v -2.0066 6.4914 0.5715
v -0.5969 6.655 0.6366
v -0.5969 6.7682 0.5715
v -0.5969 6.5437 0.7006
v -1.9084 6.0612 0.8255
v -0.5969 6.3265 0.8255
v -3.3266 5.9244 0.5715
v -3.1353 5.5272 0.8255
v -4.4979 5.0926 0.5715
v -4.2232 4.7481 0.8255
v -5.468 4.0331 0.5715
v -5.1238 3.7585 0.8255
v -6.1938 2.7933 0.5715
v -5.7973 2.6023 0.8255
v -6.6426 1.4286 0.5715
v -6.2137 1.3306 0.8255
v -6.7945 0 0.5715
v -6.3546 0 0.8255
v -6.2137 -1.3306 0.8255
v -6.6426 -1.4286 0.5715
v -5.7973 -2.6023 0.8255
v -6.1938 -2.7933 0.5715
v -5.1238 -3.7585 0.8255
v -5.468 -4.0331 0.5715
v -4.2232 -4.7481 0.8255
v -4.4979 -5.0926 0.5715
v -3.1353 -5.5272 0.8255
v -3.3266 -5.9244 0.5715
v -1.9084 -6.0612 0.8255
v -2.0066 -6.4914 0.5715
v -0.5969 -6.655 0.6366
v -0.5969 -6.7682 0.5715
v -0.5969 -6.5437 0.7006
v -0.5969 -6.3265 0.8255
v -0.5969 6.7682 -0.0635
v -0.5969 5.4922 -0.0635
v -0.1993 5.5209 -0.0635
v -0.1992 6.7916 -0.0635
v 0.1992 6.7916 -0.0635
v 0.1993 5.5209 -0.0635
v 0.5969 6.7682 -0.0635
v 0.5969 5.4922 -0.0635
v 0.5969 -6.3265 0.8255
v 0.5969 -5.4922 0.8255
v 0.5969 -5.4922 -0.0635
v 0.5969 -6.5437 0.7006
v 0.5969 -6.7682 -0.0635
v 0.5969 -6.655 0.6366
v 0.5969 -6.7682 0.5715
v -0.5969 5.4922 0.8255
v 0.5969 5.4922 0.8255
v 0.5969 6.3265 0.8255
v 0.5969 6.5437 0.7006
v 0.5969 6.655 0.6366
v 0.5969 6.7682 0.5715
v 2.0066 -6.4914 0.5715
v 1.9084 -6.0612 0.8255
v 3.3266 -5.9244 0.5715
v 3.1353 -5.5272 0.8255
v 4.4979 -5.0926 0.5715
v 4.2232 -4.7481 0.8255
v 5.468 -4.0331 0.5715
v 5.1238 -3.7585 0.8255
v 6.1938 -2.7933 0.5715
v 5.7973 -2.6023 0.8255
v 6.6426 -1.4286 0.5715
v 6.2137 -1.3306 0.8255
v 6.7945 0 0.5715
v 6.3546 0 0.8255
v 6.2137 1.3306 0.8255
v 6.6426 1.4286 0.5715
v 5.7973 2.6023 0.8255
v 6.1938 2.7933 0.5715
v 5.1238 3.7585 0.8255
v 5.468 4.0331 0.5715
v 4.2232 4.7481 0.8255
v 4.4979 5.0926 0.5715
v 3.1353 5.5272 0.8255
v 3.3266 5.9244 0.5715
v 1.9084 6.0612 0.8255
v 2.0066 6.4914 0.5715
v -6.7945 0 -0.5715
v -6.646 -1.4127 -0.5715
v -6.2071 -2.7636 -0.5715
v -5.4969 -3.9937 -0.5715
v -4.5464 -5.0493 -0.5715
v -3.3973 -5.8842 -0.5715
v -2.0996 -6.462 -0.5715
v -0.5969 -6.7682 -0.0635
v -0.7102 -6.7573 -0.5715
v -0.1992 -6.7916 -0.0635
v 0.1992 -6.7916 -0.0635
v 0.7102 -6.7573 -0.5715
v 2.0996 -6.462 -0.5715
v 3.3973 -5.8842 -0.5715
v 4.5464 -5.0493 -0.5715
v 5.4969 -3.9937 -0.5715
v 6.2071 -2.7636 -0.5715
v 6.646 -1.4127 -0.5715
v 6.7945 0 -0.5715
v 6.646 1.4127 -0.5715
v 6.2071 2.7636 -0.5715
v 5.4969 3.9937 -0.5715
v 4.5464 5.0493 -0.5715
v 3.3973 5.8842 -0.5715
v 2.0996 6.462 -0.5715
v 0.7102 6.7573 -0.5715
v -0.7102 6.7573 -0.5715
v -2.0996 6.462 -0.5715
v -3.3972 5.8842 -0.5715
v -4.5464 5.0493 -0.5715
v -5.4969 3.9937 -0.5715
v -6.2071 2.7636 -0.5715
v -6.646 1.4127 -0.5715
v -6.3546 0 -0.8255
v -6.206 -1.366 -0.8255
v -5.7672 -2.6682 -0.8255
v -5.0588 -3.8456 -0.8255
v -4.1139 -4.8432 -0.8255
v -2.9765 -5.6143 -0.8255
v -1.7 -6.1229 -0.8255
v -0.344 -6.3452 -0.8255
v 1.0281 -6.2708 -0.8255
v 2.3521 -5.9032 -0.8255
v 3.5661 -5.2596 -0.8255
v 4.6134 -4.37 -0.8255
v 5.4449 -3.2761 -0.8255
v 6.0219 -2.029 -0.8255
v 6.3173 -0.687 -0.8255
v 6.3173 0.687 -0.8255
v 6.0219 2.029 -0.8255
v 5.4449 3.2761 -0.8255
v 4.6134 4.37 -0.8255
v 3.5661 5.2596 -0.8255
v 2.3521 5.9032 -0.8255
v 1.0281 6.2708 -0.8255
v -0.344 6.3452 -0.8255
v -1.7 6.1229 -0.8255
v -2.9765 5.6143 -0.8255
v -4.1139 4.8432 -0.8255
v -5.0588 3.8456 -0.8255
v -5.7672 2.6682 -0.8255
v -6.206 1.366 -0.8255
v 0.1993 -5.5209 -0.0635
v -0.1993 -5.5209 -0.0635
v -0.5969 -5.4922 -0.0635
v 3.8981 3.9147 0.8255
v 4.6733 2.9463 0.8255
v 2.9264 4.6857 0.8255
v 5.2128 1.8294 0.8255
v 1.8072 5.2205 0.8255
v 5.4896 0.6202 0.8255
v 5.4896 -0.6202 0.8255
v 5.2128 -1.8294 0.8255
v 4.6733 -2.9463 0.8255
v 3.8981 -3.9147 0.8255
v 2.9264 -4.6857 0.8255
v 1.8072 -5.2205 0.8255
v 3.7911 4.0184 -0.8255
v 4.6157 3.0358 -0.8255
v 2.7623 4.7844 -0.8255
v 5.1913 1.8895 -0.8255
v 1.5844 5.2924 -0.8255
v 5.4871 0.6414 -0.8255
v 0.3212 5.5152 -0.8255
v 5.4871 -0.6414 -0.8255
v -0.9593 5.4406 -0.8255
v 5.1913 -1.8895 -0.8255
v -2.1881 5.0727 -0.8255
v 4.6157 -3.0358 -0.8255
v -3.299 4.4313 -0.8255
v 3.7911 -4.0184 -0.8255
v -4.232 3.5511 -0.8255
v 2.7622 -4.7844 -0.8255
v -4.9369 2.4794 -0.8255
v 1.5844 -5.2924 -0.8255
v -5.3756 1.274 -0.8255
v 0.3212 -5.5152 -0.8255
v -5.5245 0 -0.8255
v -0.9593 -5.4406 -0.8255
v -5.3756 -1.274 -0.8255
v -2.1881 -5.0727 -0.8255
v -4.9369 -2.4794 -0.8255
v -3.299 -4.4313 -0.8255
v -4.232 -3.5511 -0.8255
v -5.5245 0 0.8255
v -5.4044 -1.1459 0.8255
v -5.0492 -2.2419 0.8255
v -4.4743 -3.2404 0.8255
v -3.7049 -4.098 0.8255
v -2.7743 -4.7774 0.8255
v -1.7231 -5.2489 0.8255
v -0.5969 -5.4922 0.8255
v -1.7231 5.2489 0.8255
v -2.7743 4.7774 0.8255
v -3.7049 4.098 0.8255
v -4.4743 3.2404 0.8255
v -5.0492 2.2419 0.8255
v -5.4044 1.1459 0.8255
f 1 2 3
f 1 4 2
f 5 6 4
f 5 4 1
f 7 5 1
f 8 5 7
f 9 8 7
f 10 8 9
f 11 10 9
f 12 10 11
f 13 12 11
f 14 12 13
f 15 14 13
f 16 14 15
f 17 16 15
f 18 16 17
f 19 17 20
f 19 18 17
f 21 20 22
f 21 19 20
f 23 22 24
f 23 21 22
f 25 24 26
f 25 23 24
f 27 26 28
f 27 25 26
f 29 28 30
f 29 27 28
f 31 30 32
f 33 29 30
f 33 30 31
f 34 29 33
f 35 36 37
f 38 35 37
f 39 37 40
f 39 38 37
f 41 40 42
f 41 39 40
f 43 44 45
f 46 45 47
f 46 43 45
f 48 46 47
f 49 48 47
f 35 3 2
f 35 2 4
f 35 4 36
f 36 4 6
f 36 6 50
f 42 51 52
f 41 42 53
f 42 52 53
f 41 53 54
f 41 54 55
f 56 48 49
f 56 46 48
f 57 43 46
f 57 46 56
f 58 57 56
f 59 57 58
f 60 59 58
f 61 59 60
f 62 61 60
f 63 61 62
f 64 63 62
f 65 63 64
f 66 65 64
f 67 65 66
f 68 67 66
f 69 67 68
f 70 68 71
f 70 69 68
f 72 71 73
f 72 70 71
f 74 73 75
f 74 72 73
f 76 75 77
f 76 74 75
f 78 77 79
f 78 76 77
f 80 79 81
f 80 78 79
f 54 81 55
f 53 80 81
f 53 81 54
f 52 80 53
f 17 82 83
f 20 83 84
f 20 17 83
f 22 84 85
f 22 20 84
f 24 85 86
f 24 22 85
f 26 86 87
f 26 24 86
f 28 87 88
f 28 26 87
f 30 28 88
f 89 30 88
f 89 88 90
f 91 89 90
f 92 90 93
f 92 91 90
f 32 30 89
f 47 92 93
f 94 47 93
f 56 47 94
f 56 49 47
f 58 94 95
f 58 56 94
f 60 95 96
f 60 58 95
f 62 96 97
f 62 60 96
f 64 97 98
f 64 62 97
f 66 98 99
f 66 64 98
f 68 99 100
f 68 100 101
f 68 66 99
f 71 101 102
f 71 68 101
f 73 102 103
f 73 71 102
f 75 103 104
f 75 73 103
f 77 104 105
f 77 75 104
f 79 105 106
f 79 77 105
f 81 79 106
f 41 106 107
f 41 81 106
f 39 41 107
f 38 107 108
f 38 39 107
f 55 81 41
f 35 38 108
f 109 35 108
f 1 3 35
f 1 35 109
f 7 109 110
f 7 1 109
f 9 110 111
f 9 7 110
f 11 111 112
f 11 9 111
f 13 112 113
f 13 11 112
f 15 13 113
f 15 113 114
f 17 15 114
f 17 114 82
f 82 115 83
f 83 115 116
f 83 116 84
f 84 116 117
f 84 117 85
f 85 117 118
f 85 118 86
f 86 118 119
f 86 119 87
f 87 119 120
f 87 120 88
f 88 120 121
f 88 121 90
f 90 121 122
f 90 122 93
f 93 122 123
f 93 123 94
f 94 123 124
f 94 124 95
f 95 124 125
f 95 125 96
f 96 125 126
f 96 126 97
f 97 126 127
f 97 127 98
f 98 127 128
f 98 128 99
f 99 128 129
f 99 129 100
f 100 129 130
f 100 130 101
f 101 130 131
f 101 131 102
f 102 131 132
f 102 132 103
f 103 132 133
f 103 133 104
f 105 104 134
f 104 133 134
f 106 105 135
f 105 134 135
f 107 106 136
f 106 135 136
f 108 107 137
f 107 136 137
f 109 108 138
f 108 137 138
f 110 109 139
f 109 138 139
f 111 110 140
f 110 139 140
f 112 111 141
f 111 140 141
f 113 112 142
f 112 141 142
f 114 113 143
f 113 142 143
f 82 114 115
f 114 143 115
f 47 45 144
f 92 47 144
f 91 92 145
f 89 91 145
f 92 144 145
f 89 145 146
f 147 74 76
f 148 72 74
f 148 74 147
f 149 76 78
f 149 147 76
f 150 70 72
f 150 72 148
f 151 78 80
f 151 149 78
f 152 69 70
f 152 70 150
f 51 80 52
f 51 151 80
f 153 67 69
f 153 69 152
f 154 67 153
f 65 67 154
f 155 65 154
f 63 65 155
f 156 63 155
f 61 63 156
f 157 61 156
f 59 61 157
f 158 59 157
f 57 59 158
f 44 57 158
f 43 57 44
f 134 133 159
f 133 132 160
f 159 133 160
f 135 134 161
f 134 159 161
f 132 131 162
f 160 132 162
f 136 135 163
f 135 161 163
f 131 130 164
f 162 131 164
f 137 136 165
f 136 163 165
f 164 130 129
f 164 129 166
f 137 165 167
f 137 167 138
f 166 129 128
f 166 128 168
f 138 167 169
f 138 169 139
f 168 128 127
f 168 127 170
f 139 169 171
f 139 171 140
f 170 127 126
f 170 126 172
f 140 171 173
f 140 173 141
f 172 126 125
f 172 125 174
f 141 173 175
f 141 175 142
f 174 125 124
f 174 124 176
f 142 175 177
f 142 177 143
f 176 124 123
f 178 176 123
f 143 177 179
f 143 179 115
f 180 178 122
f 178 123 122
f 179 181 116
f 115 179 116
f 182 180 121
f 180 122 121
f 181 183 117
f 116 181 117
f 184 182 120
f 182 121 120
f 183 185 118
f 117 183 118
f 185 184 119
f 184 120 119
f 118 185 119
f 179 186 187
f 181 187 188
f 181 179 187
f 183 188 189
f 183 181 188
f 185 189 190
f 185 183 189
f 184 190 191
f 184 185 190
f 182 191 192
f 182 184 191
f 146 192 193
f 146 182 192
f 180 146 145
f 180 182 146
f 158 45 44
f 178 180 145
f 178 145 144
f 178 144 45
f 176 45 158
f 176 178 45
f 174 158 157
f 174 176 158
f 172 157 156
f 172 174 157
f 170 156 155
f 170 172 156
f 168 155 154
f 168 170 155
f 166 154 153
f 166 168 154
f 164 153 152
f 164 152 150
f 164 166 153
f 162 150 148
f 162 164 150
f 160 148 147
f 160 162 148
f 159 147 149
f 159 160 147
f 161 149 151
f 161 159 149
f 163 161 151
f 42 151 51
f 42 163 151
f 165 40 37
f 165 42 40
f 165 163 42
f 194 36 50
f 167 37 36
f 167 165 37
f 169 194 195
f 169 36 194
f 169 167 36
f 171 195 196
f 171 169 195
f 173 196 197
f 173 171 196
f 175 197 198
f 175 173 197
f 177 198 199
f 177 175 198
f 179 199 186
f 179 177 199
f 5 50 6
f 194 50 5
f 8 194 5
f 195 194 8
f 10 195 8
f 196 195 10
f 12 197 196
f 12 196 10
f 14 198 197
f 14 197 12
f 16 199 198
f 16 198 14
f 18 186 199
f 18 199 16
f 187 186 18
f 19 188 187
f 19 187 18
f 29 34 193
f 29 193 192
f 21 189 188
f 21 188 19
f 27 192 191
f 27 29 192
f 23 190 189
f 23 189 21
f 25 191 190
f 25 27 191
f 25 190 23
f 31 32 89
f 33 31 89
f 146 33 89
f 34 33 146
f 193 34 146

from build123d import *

# Parameters (mm, degrees)
SKETCH1_R          = 6.7945
SKETCH1_R_2        = 5.5245
EXTRUDE1_DEPTH     = 0.8255
CUT_EXTRUDE1_DEPTH = 0.889
CHAMFER1_SIZE      = 0.254
CHAMFER1_SIZE2     = 0.439940905


with BuildPart() as part:
    # Sketch1 → Extrude1 (new, symmetric)
    with BuildSketch(Plane.XY):
        with Locations(Location((0, 0, 0), (0, 0, 180))):
            Circle(SKETCH1_R)
        with Locations(Location((0, 0, 0), (0, 0, 180))):
            Circle(SKETCH1_R_2, mode=Mode.SUBTRACT)
    extrude(amount=EXTRUDE1_DEPTH, both=True)

    # Sketch2 → Cut-Extrude1 (cut)
    with BuildSketch(Plane.XY.offset(0.8255)):
        with BuildLine():
            Line((-0.5969, 6.768230244), (-0.5969, 5.492159014))
            ThreePointArc((-0.5969, 5.492159014), (0, 5.5245), (0.5969, 5.492159014))
            Line((0.5969, 5.492159014), (0.5969, 6.768230244))
            ThreePointArc((0.5969, 6.768230244), (0, 6.7945), (-0.5969, 6.768230244))
        make_face()
        with BuildLine():
            Line((-0.5969, -6.768230244), (-0.5969, -5.492159014))
            ThreePointArc((-0.5969, -5.492159014), (0, -5.5245), (0.5969, -5.492159014))
            Line((0.5969, -5.492159014), (0.5969, -6.768230244))
            ThreePointArc((0.5969, -6.768230244), (0, -6.7945), (-0.5969, -6.768230244))
        make_face()
    extrude(amount=-CUT_EXTRUDE1_DEPTH, mode=Mode.SUBTRACT)

    # Chamfer1
    chamfer1_edges = [part.edges().sort_by_distance(p)[0] for p in [
        (-5.011031196, -4.588550599, 0.8255),
        (6.7945, 0, -0.8255),
        (6.7945, 0, 0.8255),
    ]]
    chamfer1_side = [part.faces().sort_by_distance(p)[0] for p in [
        (6.7945, 0, 0),
    ]]
    chamfer(chamfer1_edges, length=CHAMFER1_SIZE, length2=CHAMFER1_SIZE2, reference=chamfer1_side[0])


solid = part.part
